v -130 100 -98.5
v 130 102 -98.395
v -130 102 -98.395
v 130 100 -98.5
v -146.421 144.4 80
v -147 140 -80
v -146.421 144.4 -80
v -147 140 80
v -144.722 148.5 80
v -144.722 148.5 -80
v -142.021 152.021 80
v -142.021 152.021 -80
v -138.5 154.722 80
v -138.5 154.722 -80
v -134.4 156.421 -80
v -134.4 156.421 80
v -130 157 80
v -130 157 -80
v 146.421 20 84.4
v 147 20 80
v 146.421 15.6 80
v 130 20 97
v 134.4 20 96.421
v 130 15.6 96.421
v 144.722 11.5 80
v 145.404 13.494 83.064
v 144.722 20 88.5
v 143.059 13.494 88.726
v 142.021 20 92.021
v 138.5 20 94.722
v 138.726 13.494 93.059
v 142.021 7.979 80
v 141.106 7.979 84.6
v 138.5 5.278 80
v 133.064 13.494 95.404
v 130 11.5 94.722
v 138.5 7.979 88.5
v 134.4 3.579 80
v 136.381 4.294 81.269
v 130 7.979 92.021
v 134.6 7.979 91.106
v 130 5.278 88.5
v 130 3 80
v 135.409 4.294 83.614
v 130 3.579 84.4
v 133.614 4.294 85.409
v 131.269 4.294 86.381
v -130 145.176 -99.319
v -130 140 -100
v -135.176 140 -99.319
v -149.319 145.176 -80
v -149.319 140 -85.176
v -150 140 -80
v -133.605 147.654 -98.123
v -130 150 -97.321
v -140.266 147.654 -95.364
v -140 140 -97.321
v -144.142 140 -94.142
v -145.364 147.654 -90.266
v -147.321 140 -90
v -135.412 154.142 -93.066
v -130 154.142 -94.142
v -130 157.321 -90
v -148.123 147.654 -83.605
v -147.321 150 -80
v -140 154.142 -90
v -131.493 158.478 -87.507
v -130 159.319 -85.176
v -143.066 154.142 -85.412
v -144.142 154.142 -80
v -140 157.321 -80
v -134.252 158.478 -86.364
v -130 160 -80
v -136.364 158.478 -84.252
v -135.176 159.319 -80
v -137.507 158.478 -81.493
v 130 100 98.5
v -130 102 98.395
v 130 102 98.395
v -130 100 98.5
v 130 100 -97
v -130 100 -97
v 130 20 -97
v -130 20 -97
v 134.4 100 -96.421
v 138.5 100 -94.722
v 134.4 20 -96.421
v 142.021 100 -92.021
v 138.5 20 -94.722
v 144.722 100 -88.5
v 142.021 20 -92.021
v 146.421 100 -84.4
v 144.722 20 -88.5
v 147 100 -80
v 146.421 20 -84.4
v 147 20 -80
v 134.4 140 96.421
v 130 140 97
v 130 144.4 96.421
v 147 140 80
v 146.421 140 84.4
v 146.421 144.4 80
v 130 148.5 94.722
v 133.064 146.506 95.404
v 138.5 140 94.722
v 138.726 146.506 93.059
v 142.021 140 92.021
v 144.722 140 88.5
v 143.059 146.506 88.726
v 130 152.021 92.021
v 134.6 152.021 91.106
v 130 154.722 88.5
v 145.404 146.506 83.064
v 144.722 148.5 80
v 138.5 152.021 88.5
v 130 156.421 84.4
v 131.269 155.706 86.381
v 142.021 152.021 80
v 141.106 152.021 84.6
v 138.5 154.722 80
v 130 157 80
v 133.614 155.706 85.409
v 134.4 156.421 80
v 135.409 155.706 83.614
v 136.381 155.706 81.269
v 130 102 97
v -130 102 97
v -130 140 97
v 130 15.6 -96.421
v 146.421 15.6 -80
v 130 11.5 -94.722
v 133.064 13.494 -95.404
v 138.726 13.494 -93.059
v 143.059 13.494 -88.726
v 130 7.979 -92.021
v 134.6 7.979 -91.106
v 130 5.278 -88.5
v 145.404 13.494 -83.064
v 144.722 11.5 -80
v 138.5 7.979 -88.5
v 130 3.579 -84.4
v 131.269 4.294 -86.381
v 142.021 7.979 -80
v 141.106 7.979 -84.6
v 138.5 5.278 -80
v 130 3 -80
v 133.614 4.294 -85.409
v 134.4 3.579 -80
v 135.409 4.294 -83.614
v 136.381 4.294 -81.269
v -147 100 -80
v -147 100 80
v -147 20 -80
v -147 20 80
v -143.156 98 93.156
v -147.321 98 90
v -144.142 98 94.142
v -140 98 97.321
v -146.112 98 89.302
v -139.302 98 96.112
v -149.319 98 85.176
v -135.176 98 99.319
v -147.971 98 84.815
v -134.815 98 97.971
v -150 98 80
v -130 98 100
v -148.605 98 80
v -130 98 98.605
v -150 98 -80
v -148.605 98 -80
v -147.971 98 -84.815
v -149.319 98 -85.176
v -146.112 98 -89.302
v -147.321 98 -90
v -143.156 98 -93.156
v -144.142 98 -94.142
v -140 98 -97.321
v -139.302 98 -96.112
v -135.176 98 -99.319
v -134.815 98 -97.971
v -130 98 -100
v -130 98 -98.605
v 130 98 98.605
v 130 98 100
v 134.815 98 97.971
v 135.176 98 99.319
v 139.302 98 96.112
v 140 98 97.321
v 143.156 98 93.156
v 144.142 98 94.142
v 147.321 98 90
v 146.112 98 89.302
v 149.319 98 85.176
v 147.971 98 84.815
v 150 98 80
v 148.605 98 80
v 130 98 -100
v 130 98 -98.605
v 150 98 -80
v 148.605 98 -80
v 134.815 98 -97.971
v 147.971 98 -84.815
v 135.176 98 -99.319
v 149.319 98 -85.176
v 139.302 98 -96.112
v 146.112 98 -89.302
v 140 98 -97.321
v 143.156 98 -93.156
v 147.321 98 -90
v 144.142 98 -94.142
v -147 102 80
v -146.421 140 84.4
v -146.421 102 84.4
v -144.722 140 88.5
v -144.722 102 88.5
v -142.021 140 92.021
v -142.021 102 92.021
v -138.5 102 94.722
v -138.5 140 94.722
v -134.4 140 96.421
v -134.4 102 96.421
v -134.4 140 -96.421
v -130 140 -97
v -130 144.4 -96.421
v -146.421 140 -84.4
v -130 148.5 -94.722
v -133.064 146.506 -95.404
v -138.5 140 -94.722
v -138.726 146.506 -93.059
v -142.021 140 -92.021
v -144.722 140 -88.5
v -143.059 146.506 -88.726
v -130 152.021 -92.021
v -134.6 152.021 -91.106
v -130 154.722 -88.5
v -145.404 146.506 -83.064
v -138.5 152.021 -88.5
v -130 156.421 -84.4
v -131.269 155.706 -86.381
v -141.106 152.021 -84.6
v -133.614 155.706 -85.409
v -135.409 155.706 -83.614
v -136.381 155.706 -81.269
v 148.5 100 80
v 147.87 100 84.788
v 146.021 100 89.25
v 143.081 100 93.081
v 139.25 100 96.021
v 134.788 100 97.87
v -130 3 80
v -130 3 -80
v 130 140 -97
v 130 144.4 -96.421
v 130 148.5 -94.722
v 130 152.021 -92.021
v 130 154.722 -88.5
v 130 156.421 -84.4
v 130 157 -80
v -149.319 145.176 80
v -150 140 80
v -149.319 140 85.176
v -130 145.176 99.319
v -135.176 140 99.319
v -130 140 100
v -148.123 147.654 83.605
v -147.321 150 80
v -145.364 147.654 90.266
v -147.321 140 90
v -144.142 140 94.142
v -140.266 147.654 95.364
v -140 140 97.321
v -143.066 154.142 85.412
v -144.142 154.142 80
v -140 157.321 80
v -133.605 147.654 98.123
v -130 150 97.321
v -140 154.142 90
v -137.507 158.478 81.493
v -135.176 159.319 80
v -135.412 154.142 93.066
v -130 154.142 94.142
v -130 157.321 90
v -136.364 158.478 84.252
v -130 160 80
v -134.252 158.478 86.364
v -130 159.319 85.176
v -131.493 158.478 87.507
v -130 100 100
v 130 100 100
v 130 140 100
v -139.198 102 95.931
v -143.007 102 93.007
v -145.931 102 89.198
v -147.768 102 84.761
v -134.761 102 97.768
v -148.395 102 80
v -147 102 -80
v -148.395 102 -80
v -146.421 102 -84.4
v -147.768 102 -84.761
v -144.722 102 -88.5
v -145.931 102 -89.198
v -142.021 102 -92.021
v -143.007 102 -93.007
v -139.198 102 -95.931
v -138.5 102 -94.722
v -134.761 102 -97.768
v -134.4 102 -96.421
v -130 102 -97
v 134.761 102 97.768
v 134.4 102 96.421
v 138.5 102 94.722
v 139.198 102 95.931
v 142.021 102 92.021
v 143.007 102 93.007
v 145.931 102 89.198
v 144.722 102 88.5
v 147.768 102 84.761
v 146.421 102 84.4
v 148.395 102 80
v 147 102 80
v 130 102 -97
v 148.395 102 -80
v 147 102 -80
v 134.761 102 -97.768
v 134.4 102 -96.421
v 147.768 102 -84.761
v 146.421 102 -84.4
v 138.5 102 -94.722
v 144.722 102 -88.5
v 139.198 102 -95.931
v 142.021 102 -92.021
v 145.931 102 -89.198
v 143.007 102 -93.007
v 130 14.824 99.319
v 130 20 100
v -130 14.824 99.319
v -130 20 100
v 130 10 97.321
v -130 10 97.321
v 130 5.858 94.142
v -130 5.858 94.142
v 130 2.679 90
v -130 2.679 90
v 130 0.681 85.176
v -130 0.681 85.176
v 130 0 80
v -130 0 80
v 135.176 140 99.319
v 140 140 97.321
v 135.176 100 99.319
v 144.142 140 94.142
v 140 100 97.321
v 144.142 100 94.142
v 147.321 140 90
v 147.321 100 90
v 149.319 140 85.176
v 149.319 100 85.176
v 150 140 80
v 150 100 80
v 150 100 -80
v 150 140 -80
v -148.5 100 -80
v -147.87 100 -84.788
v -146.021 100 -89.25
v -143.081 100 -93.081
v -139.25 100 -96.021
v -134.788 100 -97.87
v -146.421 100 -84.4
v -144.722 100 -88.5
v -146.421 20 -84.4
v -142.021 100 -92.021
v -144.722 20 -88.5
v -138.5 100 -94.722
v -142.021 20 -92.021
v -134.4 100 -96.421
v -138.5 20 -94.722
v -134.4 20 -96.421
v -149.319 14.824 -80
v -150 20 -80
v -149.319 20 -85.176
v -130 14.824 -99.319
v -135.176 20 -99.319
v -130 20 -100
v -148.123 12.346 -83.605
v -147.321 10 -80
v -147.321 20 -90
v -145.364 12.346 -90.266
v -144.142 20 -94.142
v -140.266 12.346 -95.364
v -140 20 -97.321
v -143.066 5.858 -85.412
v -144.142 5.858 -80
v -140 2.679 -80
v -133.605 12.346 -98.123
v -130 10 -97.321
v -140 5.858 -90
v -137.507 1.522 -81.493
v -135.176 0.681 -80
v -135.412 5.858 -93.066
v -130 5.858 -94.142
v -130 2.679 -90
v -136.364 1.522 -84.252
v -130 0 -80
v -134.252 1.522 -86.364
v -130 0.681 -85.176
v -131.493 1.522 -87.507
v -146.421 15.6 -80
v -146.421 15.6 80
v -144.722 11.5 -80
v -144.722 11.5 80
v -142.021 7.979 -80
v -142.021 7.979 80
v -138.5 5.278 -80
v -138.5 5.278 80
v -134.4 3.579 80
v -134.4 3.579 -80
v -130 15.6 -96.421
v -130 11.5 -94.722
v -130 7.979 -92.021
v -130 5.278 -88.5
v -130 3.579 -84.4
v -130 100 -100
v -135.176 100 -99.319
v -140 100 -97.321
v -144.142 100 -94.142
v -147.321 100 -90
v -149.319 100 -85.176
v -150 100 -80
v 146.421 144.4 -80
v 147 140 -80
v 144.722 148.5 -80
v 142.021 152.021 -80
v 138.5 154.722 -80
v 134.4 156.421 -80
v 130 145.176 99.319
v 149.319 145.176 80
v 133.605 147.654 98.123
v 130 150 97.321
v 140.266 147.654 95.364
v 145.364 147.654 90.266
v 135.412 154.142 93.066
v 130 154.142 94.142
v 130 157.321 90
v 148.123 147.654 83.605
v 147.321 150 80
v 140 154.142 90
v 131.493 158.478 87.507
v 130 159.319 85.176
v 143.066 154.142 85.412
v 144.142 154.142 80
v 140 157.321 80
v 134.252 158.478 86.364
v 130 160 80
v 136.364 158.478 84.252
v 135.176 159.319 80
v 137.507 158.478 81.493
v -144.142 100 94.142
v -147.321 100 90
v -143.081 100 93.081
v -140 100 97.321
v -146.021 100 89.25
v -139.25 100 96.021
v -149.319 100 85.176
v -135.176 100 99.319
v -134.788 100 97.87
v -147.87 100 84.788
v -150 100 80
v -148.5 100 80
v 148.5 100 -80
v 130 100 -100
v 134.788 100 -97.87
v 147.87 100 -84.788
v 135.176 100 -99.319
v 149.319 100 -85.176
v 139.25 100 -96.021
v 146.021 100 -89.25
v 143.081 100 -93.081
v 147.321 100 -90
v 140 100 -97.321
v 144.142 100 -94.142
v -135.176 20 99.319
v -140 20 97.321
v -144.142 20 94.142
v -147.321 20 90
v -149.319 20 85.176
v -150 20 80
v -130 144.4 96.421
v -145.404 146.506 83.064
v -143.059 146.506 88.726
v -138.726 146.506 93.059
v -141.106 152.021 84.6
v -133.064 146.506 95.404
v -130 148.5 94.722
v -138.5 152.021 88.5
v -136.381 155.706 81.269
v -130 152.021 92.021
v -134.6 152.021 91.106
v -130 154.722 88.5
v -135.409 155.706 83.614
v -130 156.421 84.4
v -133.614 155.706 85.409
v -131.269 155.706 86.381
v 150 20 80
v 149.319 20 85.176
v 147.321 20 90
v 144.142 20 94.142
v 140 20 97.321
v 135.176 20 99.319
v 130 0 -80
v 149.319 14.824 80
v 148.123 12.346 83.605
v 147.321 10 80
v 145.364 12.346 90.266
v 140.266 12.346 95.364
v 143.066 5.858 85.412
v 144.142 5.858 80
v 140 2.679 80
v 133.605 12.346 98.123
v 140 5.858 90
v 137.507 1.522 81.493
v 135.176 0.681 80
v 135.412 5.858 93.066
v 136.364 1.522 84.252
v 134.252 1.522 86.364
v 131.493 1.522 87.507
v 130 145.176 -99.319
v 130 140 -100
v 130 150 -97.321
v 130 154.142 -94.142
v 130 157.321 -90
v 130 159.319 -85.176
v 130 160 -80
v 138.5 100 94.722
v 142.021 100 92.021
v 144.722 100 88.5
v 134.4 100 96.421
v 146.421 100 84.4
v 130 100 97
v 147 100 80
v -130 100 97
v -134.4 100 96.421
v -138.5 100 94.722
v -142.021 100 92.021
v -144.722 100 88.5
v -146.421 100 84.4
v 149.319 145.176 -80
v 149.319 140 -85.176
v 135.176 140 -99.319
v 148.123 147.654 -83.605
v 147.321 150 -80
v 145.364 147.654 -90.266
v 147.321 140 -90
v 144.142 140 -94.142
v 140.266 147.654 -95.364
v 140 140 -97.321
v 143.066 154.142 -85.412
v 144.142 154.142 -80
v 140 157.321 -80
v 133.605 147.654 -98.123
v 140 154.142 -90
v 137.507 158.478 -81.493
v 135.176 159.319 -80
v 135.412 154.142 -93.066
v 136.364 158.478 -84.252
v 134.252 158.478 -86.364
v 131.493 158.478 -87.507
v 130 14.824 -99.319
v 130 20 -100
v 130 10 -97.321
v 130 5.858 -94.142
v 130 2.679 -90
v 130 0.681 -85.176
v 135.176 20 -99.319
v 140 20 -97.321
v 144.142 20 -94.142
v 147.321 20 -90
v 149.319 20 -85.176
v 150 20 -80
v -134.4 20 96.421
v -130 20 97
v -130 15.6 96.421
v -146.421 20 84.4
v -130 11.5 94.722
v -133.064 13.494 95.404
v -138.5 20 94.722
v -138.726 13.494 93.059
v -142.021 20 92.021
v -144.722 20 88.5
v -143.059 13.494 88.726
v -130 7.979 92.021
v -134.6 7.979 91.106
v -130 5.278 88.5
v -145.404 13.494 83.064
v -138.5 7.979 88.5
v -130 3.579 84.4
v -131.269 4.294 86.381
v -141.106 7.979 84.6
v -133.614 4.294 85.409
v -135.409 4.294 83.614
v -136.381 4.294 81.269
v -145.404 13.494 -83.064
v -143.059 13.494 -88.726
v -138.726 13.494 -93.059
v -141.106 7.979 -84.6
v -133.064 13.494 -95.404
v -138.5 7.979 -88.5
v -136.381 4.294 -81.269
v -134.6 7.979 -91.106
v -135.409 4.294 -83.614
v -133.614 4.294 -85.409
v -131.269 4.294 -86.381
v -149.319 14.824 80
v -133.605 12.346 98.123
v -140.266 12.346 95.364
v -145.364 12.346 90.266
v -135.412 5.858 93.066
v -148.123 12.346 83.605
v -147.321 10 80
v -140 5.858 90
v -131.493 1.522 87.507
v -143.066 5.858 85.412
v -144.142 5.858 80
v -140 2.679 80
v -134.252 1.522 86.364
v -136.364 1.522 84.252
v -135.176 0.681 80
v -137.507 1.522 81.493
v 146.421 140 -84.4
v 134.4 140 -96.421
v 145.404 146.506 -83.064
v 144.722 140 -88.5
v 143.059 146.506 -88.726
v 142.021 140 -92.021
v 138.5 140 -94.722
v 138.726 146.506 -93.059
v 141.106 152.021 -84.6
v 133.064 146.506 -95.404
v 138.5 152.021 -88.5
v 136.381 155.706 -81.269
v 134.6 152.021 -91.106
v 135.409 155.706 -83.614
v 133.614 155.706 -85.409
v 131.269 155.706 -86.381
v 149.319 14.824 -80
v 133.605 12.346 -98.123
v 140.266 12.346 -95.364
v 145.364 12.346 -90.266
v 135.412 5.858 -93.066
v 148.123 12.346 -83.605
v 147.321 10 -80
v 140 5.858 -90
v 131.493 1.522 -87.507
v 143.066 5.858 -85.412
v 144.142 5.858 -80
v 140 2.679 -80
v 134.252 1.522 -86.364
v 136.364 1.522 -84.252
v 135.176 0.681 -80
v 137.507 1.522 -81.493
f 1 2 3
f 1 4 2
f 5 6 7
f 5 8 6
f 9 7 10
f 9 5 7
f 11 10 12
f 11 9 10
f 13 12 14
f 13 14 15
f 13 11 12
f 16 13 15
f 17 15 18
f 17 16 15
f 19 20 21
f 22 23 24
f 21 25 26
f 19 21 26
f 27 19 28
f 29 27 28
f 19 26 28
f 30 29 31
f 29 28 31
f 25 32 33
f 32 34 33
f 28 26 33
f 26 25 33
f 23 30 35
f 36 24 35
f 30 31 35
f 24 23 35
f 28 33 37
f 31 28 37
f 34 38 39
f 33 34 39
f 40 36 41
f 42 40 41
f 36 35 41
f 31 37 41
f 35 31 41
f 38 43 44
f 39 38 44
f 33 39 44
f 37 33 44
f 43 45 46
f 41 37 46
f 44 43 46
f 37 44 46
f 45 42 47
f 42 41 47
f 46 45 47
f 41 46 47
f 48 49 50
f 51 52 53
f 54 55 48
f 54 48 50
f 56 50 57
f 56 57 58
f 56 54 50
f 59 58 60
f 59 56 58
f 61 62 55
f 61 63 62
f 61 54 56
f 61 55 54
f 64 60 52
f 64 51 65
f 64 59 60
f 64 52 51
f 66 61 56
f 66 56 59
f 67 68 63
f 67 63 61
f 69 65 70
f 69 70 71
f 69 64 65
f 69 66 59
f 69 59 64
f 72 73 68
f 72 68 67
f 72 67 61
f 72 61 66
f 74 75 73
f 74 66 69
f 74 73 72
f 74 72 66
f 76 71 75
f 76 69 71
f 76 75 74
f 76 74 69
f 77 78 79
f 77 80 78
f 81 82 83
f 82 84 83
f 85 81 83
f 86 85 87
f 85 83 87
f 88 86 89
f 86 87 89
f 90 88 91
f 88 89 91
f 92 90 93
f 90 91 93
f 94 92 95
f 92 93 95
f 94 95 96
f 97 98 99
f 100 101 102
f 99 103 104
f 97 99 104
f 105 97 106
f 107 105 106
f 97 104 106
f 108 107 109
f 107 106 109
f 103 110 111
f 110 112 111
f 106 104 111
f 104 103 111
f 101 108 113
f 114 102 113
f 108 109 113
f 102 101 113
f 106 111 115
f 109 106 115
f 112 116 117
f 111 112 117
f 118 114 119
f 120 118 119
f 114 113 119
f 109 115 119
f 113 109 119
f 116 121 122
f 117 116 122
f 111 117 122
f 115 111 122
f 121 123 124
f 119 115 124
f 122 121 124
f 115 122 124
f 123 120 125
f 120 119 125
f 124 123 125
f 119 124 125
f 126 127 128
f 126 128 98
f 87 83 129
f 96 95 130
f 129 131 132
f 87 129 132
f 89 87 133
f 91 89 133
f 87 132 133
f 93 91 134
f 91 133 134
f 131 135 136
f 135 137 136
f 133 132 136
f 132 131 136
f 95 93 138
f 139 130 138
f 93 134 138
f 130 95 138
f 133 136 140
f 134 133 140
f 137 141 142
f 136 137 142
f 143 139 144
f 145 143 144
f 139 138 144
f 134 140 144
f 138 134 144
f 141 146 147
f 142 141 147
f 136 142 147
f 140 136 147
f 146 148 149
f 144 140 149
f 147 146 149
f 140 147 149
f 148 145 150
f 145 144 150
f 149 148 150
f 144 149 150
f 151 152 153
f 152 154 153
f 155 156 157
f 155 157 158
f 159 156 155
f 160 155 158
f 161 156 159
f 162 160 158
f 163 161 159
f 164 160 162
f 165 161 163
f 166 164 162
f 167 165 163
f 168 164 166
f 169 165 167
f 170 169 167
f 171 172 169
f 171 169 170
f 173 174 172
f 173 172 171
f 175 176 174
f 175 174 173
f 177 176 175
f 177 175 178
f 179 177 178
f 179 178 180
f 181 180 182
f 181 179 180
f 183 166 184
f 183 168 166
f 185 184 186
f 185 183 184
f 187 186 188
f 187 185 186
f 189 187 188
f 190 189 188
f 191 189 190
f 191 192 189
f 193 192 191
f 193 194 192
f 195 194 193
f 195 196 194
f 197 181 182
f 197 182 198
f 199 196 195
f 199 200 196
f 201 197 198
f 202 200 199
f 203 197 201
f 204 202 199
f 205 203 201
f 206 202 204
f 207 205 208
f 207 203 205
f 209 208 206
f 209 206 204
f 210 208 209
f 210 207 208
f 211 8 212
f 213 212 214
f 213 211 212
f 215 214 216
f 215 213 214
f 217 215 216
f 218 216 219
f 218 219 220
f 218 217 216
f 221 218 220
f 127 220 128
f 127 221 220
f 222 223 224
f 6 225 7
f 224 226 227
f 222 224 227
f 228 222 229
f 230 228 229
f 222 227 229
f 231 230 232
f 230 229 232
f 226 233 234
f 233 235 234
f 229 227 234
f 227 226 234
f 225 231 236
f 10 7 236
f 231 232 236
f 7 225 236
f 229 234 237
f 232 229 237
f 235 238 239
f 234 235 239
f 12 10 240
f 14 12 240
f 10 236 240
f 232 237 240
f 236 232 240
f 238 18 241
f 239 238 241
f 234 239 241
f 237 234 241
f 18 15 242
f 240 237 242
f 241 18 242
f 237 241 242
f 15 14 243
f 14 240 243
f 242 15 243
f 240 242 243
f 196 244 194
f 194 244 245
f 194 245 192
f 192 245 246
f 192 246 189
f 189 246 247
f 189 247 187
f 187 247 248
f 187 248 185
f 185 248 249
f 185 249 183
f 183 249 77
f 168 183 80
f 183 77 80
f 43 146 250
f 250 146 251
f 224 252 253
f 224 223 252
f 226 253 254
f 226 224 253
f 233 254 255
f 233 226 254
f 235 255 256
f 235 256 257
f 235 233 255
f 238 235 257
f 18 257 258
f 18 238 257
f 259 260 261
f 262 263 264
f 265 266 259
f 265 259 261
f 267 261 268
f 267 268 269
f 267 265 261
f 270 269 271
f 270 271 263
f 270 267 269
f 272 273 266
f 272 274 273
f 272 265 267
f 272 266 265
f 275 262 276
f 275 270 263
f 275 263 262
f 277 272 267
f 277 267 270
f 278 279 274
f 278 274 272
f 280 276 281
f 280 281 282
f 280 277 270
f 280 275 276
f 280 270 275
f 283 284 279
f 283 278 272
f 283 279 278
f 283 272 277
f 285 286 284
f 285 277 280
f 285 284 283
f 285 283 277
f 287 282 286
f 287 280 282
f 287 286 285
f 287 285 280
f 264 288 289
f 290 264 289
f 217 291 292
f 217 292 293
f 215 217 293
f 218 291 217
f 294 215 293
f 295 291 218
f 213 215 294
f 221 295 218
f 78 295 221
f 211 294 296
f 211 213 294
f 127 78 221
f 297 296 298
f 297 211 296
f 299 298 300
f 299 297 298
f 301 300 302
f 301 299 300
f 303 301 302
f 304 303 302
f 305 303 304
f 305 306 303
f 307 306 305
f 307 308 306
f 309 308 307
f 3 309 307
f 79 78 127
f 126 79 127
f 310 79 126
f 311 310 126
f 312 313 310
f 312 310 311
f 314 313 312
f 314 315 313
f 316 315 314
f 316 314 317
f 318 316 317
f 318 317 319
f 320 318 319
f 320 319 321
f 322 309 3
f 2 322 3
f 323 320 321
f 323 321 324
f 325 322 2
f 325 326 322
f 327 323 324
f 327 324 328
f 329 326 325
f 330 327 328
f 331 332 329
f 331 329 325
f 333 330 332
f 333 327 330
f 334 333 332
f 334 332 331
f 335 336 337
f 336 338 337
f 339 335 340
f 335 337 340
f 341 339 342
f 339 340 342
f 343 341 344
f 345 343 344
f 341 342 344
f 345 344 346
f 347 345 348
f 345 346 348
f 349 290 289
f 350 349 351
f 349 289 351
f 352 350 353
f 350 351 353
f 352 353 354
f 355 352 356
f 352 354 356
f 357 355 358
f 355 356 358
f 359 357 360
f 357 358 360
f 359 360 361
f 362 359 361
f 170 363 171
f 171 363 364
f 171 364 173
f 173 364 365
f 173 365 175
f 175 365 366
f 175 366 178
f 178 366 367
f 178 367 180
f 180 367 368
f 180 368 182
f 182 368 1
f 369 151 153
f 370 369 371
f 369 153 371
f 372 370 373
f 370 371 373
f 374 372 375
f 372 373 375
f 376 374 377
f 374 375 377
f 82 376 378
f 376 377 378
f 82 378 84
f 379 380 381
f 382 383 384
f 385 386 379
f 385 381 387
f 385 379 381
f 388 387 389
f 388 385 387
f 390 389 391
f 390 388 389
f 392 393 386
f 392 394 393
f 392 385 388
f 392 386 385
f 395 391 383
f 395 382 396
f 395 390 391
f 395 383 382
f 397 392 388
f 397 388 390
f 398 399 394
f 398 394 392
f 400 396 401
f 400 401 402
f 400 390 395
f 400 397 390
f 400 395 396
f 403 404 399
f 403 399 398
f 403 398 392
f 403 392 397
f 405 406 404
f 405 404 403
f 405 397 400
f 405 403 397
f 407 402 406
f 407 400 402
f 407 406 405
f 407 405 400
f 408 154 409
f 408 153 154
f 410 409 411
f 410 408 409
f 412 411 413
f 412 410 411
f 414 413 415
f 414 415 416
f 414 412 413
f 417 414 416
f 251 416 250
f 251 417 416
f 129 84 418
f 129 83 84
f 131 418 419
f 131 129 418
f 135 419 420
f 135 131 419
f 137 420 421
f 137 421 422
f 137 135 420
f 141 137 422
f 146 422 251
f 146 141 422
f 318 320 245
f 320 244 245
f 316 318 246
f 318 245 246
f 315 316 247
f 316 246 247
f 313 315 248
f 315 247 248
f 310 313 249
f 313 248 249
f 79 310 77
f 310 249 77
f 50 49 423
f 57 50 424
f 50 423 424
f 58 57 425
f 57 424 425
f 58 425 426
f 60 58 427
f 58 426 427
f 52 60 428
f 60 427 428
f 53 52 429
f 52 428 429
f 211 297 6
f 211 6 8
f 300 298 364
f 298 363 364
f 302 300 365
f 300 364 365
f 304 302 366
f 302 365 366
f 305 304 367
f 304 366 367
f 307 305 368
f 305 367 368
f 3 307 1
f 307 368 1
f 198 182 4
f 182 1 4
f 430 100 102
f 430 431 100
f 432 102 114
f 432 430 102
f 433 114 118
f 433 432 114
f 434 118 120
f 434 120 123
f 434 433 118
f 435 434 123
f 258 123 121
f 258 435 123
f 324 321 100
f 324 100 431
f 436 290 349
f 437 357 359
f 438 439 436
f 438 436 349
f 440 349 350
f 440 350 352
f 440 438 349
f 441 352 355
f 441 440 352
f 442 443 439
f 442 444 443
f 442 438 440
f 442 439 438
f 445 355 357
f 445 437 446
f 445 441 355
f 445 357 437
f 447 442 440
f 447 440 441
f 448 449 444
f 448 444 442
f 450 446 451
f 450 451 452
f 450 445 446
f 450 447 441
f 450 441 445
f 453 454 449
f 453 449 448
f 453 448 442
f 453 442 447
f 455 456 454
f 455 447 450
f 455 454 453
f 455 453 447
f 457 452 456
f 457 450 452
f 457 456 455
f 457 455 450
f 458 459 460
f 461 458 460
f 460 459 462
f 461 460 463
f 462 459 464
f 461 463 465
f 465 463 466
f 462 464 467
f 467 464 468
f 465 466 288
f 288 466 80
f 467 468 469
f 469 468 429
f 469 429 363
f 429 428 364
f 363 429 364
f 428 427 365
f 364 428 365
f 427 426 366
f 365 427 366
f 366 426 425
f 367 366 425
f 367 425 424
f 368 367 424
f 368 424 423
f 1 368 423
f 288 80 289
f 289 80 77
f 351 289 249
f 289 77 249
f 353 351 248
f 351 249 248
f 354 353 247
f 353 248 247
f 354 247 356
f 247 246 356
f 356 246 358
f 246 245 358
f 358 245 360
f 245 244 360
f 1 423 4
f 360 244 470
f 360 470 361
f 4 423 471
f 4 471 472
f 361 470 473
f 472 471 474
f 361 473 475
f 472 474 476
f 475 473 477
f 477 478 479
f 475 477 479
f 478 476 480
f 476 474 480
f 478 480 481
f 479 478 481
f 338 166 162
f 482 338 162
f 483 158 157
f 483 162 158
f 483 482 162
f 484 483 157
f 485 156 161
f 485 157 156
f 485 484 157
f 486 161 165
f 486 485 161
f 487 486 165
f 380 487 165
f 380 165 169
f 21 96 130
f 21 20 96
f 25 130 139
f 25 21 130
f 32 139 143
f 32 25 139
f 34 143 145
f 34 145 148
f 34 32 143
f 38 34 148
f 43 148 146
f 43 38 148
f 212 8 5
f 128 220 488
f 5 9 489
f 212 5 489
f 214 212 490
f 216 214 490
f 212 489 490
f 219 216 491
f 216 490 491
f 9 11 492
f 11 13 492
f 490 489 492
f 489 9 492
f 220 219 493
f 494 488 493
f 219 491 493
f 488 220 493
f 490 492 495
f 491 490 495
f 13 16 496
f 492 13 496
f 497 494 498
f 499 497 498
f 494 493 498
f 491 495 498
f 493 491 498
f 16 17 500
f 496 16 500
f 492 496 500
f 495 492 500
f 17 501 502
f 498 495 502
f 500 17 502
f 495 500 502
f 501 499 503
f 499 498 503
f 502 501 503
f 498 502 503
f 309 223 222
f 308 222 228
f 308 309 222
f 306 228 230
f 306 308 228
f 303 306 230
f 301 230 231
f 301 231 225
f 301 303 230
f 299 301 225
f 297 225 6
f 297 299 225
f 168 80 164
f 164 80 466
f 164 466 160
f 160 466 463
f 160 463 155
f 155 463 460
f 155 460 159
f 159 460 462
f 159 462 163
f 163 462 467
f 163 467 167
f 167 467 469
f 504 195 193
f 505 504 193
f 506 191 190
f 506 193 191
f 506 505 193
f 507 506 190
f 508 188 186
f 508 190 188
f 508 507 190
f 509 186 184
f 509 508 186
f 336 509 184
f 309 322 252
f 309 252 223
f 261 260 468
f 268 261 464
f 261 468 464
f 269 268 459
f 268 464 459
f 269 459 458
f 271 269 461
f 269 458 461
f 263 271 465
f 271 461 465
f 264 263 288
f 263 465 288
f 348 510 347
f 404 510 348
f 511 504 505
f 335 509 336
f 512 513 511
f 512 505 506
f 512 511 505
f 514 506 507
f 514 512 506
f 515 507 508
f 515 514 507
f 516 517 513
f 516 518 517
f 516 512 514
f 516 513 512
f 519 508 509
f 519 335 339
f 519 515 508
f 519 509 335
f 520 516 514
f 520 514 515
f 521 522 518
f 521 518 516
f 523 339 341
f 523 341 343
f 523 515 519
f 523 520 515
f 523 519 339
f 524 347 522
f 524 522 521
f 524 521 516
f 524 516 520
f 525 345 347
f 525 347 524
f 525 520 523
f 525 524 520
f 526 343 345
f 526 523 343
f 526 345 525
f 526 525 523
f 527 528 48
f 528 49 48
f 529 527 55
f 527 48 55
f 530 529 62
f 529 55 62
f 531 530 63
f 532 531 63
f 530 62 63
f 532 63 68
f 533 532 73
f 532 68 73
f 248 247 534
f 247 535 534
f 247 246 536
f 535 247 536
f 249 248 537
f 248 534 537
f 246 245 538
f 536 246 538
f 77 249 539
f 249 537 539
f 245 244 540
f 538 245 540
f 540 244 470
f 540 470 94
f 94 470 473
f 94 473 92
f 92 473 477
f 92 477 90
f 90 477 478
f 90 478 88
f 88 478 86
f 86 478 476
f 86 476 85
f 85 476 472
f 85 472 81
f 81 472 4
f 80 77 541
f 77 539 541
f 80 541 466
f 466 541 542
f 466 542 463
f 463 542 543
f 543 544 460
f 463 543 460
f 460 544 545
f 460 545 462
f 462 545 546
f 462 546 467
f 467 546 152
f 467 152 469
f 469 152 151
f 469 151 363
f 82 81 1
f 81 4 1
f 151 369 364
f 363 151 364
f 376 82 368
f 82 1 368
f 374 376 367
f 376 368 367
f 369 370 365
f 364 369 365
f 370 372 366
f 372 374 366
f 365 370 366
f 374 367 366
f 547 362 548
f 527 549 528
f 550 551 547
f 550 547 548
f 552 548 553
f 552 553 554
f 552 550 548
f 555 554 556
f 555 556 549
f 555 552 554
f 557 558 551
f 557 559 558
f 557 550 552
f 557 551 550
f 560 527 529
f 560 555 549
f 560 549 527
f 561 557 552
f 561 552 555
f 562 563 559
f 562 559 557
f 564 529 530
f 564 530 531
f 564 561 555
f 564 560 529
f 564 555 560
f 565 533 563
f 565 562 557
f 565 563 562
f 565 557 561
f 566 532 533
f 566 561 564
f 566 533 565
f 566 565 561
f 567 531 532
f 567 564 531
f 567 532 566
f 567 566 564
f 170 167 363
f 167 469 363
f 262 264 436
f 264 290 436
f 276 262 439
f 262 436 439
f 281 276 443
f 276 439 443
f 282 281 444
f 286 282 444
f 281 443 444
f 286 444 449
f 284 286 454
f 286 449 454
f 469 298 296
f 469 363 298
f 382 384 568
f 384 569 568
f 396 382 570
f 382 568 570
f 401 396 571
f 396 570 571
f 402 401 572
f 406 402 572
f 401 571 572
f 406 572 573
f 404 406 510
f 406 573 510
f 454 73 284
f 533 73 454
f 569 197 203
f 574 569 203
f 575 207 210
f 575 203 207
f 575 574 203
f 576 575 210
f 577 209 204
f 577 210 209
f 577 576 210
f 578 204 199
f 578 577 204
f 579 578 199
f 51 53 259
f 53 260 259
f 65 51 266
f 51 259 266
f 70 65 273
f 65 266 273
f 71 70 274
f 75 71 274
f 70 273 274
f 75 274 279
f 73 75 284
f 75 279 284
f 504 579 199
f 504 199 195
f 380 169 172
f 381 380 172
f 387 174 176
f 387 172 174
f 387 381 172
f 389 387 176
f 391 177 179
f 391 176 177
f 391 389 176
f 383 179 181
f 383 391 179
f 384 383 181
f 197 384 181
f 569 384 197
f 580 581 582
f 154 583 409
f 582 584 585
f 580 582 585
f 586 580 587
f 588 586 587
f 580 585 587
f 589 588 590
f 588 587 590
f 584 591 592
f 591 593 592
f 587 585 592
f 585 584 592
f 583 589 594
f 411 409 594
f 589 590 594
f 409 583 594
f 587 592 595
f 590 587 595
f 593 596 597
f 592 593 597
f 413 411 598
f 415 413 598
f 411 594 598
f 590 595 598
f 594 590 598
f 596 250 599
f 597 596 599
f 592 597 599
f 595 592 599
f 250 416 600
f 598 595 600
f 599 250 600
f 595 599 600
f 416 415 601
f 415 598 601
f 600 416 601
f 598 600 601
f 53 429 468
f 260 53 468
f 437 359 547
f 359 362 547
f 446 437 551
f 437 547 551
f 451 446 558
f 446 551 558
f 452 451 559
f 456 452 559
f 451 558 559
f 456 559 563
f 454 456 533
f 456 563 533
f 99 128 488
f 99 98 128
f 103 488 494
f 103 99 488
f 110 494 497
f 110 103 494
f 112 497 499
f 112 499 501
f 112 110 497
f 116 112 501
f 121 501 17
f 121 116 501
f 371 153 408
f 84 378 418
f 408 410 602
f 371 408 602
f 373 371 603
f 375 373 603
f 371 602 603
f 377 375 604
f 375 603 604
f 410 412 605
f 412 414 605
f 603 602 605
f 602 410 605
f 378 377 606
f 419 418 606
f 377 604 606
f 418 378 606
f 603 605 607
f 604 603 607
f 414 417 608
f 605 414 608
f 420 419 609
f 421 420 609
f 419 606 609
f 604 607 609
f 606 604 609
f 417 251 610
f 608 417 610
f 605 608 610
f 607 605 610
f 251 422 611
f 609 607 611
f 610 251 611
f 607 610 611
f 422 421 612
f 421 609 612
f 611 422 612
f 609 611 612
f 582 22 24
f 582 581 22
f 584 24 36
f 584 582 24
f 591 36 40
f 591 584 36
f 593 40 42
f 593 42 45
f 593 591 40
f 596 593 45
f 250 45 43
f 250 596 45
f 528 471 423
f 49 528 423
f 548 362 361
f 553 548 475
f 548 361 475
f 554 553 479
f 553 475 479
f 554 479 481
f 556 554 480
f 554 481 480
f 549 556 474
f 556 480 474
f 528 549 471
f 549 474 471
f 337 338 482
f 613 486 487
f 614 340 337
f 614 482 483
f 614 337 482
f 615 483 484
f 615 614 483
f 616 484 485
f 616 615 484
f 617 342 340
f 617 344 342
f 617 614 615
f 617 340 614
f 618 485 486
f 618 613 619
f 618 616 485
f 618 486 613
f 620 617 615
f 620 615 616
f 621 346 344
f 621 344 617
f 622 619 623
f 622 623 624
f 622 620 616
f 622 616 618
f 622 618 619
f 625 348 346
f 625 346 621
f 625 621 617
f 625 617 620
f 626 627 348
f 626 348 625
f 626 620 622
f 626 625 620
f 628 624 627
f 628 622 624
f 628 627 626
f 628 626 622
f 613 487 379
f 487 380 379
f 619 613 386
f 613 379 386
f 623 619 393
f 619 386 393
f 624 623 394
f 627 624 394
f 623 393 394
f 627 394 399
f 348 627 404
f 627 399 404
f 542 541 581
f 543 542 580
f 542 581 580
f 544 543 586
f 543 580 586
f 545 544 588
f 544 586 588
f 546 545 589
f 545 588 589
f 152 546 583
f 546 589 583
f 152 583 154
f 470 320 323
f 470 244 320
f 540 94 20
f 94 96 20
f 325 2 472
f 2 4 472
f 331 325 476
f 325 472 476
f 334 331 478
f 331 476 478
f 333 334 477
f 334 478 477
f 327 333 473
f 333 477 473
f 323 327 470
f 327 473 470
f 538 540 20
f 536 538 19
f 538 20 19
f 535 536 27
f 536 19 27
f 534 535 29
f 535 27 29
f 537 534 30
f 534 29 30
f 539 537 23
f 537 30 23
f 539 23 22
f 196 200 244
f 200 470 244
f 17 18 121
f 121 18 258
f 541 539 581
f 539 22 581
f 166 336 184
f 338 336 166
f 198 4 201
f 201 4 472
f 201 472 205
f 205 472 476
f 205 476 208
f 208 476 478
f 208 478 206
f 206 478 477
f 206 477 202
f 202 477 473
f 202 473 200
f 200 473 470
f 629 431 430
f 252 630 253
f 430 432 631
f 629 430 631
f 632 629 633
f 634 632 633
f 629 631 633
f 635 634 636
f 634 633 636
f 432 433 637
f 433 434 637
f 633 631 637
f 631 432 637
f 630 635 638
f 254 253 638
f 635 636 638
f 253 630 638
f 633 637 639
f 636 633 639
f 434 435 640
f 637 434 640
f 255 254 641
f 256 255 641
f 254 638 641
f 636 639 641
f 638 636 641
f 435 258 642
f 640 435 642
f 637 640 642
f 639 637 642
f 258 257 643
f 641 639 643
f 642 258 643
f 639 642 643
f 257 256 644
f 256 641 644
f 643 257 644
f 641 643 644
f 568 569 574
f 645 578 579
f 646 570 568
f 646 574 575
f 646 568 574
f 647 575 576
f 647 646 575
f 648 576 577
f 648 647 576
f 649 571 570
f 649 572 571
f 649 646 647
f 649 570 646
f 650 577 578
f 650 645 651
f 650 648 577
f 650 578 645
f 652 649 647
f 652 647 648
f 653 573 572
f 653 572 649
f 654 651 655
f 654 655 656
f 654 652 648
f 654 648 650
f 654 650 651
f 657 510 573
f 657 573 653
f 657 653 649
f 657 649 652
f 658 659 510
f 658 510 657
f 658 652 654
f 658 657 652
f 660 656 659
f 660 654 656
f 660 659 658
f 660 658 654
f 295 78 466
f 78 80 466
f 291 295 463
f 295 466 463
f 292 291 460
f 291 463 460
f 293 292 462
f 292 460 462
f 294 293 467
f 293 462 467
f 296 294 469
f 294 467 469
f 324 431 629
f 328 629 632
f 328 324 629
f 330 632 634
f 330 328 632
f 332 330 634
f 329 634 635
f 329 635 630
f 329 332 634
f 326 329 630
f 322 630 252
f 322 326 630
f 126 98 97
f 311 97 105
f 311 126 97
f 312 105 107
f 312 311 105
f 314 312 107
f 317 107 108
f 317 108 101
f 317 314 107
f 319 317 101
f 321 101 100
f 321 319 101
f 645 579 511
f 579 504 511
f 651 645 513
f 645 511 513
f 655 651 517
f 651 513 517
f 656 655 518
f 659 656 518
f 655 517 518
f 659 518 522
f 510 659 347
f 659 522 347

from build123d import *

# Parameters (mm, degrees)
BOSS_EXTRUDE1_DEPTH    = 100
FILLET1_R              = 20
SHELL1_T               = -3
BOSS_EXTRUDE2_DEPTH    = 60
FILLET2_R              = 20
SHELL3_T               = -3
SELECT_FEATURES1_DEPTH = 2
SELECT_FEATURES1_TAPER = -3


with BuildPart() as part:
    # Sketch1 → Boss-Extrude1 (new body)
    with BuildSketch(Plane(origin=(0, 0, 0), x_dir=(1, 0, 0), z_dir=(0, 1, 0))):
        with BuildLine():
            Line((-130, 100), (130, 100))
            ThreePointArc((130, 100), (144.142135624, 94.142135624), (150, 80))
            Line((150, 80), (150, -80))
            ThreePointArc((150, -80), (144.142135624, -94.142135624), (130, -100))
            Line((130, -100), (-130, -100))
            ThreePointArc((-130, -100), (-144.142135624, -94.142135624), (-150, -80))
            Line((-150, -80), (-150, 80))
            ThreePointArc((-150, 80), (-144.142135624, 94.142135624), (-130, 100))
        make_face()
    extrude(amount=BOSS_EXTRUDE1_DEPTH)

    # Fillet1
    fillet1_edges = [part.edges().sort_by_distance(p)[0] for p in [
        (-150, 0, 0),
        (-144.142135624, 0, -94.142135624),
        (0, 0, -100),
        (144.142135624, 0, -94.142135624),
        (150, 0, 0),
        (144.142135624, 0, 94.142135624),
        (0, 0, 100),
        (-144.142135624, 0, 94.142135624),
    ]]
    fillet(fillet1_edges, radius=FILLET1_R)

    # Shell1
    shell1_openings = [part.faces().sort_by_distance(p)[0] for p in [
        (0, 100, 0),
    ]]
    offset(amount=SHELL1_T, openings=shell1_openings, kind=Kind.INTERSECTION)

    # Select Features1: read off the stored shape, not the designer's step
    # Select Features1 outline → Select Features1 (cut)
    with BuildSketch(Plane(origin=(0, 98, 0), x_dir=(1, 0, 0), z_dir=(0, 1, 0))):
        with BuildLine():
            Line((130, 100), (-130, 100))
            ThreePointArc((-130, 100), (-144.142135624, 94.142135624), (-150, 80))
            Line((-150, 80), (-150, -80))
            ThreePointArc((-150, -80), (-144.142135624, -94.142135624), (-130, -100))
            Line((-130, -100), (130, -100))
            ThreePointArc((130, -100), (144.142135624, -94.142135624), (150, -80))
            Line((150, -80), (150, 80))
            ThreePointArc((150, 80), (144.142135624, 94.142135624), (130, 100))
        make_face()
        with BuildLine():
            Line((-130, 98.604815559), (130, 98.604815559))
            ThreePointArc((130, 98.604815559), (143.155591244, 93.155591244), (148.604815559, 80))
            Line((148.604815559, 80), (148.604815559, -80))
            ThreePointArc((148.604815559, -80), (143.155591244, -93.155591244), (130, -98.604815559))
            Line((130, -98.604815559), (-130, -98.604815559))
            ThreePointArc((-130, -98.604815559), (-143.155591244, -93.155591244), (-148.604815559, -80))
            Line((-148.604815559, -80), (-148.604815559, 80))
            ThreePointArc((-148.604815559, 80), (-143.155591244, 93.155591244), (-130, 98.604815559))
        make_face(mode=Mode.SUBTRACT)
    extrude(amount=SELECT_FEATURES1_DEPTH, taper=SELECT_FEATURES1_TAPER, mode=Mode.SUBTRACT)


with BuildPart() as body_2:
    # Sketch2 → Boss-Extrude2 (new body)
    with BuildSketch(Plane(origin=(0, 100, 0), x_dir=(1, 0, 0), z_dir=(0, 1, 0))):
        with BuildLine():
            Line((130, 100), (-130, 100))
            ThreePointArc((-130, 100), (-144.142135624, 94.142135624), (-150, 80))
            Line((-150, 80), (-150, -80))
            ThreePointArc((-150, -80), (-144.142135624, -94.142135624), (-130, -100))
            Line((-130, -100), (130, -100))
            ThreePointArc((130, -100), (144.142135624, -94.142135624), (150, -80))
            Line((150, -80), (150, 80))
            ThreePointArc((150, 80), (144.142135624, 94.142135624), (130, 100))
        make_face()
    extrude(amount=BOSS_EXTRUDE2_DEPTH)

    # Fillet2
    fillet2_edges = [body_2.edges().sort_by_distance(p)[0] for p in [
        (-144.142135624, 160, 94.142135624),
        (0, 160, 100),
        (144.142135624, 160, 94.142135624),
        (150, 160, 0),
        (144.142135624, 160, -94.142135624),
        (0, 160, -100),
        (-144.142135624, 160, -94.142135624),
        (-150, 160, 0),
    ]]
    fillet(fillet2_edges, radius=FILLET2_R)

    # Shell3
    shell3_openings = [body_2.faces().sort_by_distance(p)[0] for p in [
        (0, 100, 0),
    ]]
    offset(amount=SHELL3_T, openings=shell3_openings, kind=Kind.INTERSECTION)

    # Groove2: read off the stored shape, not the designer's step
    # Groove2: loft between two sections, ruled curve by curve
    groove2_from = [
        Edge.make_three_point_arc((-148.395184441, 102, -80), (-143.00735966, 102, -93.00735966), (-130, 102, -98.395184441)),
        Edge.make_three_point_arc((130, 102, -98.395184441), (143.00735966, 102, -93.00735966), (148.395184441, 102, -80)),
        Edge.make_three_point_arc((148.395184441, 102, 80), (143.00735966, 102, 93.00735966), (130, 102, 98.395184441)),
        Edge.make_three_point_arc((-130, 102, 98.395184441), (-143.00735966, 102, 93.00735966), (-148.395184441, 102, 80)),
        Edge.make_line((-148.395184441, 102, -80), (-148.395184441, 102, 80)),
        Edge.make_line((130, 102, -98.395184441), (-130, 102, -98.395184441)),
        Edge.make_line((148.395184441, 102, 80), (148.395184441, 102, -80)),
        Edge.make_line((-130, 102, 98.395184441), (130, 102, 98.395184441)),
    ]
    groove2_to = [
        Edge.make_three_point_arc((-148.5, 100, -80), (-143.081475452, 100, -93.081475452), (-130, 100, -98.5)),
        Edge.make_three_point_arc((130, 100, -98.5), (143.081475452, 100, -93.081475452), (148.5, 100, -80)),
        Edge.make_three_point_arc((148.5, 100, 80), (143.081475452, 100, 93.081475452), (130, 100, 98.5)),
        Edge.make_three_point_arc((-130, 100, 98.5), (-143.081475452, 100, 93.081475452), (-148.5, 100, 80)),
        Edge.make_line((-148.5, 100, -80), (-148.5, 100, 80)),
        Edge.make_line((130, 100, -98.5), (-130, 100, -98.5)),
        Edge.make_line((148.5, 100, 80), (148.5, 100, -80)),
        Edge.make_line((-130, 100, 98.5), (130, 100, 98.5)),
    ]
    groove2 = Solid(Shell([*[Face.make_surface_from_curves(groove2_from[k], groove2_to[k]) for k in range(8)], Face(Wire(groove2_from)), Face(Wire(groove2_to))]))
    add(groove2, mode=Mode.SUBTRACT)


solid = Compound([part.part, body_2.part])
